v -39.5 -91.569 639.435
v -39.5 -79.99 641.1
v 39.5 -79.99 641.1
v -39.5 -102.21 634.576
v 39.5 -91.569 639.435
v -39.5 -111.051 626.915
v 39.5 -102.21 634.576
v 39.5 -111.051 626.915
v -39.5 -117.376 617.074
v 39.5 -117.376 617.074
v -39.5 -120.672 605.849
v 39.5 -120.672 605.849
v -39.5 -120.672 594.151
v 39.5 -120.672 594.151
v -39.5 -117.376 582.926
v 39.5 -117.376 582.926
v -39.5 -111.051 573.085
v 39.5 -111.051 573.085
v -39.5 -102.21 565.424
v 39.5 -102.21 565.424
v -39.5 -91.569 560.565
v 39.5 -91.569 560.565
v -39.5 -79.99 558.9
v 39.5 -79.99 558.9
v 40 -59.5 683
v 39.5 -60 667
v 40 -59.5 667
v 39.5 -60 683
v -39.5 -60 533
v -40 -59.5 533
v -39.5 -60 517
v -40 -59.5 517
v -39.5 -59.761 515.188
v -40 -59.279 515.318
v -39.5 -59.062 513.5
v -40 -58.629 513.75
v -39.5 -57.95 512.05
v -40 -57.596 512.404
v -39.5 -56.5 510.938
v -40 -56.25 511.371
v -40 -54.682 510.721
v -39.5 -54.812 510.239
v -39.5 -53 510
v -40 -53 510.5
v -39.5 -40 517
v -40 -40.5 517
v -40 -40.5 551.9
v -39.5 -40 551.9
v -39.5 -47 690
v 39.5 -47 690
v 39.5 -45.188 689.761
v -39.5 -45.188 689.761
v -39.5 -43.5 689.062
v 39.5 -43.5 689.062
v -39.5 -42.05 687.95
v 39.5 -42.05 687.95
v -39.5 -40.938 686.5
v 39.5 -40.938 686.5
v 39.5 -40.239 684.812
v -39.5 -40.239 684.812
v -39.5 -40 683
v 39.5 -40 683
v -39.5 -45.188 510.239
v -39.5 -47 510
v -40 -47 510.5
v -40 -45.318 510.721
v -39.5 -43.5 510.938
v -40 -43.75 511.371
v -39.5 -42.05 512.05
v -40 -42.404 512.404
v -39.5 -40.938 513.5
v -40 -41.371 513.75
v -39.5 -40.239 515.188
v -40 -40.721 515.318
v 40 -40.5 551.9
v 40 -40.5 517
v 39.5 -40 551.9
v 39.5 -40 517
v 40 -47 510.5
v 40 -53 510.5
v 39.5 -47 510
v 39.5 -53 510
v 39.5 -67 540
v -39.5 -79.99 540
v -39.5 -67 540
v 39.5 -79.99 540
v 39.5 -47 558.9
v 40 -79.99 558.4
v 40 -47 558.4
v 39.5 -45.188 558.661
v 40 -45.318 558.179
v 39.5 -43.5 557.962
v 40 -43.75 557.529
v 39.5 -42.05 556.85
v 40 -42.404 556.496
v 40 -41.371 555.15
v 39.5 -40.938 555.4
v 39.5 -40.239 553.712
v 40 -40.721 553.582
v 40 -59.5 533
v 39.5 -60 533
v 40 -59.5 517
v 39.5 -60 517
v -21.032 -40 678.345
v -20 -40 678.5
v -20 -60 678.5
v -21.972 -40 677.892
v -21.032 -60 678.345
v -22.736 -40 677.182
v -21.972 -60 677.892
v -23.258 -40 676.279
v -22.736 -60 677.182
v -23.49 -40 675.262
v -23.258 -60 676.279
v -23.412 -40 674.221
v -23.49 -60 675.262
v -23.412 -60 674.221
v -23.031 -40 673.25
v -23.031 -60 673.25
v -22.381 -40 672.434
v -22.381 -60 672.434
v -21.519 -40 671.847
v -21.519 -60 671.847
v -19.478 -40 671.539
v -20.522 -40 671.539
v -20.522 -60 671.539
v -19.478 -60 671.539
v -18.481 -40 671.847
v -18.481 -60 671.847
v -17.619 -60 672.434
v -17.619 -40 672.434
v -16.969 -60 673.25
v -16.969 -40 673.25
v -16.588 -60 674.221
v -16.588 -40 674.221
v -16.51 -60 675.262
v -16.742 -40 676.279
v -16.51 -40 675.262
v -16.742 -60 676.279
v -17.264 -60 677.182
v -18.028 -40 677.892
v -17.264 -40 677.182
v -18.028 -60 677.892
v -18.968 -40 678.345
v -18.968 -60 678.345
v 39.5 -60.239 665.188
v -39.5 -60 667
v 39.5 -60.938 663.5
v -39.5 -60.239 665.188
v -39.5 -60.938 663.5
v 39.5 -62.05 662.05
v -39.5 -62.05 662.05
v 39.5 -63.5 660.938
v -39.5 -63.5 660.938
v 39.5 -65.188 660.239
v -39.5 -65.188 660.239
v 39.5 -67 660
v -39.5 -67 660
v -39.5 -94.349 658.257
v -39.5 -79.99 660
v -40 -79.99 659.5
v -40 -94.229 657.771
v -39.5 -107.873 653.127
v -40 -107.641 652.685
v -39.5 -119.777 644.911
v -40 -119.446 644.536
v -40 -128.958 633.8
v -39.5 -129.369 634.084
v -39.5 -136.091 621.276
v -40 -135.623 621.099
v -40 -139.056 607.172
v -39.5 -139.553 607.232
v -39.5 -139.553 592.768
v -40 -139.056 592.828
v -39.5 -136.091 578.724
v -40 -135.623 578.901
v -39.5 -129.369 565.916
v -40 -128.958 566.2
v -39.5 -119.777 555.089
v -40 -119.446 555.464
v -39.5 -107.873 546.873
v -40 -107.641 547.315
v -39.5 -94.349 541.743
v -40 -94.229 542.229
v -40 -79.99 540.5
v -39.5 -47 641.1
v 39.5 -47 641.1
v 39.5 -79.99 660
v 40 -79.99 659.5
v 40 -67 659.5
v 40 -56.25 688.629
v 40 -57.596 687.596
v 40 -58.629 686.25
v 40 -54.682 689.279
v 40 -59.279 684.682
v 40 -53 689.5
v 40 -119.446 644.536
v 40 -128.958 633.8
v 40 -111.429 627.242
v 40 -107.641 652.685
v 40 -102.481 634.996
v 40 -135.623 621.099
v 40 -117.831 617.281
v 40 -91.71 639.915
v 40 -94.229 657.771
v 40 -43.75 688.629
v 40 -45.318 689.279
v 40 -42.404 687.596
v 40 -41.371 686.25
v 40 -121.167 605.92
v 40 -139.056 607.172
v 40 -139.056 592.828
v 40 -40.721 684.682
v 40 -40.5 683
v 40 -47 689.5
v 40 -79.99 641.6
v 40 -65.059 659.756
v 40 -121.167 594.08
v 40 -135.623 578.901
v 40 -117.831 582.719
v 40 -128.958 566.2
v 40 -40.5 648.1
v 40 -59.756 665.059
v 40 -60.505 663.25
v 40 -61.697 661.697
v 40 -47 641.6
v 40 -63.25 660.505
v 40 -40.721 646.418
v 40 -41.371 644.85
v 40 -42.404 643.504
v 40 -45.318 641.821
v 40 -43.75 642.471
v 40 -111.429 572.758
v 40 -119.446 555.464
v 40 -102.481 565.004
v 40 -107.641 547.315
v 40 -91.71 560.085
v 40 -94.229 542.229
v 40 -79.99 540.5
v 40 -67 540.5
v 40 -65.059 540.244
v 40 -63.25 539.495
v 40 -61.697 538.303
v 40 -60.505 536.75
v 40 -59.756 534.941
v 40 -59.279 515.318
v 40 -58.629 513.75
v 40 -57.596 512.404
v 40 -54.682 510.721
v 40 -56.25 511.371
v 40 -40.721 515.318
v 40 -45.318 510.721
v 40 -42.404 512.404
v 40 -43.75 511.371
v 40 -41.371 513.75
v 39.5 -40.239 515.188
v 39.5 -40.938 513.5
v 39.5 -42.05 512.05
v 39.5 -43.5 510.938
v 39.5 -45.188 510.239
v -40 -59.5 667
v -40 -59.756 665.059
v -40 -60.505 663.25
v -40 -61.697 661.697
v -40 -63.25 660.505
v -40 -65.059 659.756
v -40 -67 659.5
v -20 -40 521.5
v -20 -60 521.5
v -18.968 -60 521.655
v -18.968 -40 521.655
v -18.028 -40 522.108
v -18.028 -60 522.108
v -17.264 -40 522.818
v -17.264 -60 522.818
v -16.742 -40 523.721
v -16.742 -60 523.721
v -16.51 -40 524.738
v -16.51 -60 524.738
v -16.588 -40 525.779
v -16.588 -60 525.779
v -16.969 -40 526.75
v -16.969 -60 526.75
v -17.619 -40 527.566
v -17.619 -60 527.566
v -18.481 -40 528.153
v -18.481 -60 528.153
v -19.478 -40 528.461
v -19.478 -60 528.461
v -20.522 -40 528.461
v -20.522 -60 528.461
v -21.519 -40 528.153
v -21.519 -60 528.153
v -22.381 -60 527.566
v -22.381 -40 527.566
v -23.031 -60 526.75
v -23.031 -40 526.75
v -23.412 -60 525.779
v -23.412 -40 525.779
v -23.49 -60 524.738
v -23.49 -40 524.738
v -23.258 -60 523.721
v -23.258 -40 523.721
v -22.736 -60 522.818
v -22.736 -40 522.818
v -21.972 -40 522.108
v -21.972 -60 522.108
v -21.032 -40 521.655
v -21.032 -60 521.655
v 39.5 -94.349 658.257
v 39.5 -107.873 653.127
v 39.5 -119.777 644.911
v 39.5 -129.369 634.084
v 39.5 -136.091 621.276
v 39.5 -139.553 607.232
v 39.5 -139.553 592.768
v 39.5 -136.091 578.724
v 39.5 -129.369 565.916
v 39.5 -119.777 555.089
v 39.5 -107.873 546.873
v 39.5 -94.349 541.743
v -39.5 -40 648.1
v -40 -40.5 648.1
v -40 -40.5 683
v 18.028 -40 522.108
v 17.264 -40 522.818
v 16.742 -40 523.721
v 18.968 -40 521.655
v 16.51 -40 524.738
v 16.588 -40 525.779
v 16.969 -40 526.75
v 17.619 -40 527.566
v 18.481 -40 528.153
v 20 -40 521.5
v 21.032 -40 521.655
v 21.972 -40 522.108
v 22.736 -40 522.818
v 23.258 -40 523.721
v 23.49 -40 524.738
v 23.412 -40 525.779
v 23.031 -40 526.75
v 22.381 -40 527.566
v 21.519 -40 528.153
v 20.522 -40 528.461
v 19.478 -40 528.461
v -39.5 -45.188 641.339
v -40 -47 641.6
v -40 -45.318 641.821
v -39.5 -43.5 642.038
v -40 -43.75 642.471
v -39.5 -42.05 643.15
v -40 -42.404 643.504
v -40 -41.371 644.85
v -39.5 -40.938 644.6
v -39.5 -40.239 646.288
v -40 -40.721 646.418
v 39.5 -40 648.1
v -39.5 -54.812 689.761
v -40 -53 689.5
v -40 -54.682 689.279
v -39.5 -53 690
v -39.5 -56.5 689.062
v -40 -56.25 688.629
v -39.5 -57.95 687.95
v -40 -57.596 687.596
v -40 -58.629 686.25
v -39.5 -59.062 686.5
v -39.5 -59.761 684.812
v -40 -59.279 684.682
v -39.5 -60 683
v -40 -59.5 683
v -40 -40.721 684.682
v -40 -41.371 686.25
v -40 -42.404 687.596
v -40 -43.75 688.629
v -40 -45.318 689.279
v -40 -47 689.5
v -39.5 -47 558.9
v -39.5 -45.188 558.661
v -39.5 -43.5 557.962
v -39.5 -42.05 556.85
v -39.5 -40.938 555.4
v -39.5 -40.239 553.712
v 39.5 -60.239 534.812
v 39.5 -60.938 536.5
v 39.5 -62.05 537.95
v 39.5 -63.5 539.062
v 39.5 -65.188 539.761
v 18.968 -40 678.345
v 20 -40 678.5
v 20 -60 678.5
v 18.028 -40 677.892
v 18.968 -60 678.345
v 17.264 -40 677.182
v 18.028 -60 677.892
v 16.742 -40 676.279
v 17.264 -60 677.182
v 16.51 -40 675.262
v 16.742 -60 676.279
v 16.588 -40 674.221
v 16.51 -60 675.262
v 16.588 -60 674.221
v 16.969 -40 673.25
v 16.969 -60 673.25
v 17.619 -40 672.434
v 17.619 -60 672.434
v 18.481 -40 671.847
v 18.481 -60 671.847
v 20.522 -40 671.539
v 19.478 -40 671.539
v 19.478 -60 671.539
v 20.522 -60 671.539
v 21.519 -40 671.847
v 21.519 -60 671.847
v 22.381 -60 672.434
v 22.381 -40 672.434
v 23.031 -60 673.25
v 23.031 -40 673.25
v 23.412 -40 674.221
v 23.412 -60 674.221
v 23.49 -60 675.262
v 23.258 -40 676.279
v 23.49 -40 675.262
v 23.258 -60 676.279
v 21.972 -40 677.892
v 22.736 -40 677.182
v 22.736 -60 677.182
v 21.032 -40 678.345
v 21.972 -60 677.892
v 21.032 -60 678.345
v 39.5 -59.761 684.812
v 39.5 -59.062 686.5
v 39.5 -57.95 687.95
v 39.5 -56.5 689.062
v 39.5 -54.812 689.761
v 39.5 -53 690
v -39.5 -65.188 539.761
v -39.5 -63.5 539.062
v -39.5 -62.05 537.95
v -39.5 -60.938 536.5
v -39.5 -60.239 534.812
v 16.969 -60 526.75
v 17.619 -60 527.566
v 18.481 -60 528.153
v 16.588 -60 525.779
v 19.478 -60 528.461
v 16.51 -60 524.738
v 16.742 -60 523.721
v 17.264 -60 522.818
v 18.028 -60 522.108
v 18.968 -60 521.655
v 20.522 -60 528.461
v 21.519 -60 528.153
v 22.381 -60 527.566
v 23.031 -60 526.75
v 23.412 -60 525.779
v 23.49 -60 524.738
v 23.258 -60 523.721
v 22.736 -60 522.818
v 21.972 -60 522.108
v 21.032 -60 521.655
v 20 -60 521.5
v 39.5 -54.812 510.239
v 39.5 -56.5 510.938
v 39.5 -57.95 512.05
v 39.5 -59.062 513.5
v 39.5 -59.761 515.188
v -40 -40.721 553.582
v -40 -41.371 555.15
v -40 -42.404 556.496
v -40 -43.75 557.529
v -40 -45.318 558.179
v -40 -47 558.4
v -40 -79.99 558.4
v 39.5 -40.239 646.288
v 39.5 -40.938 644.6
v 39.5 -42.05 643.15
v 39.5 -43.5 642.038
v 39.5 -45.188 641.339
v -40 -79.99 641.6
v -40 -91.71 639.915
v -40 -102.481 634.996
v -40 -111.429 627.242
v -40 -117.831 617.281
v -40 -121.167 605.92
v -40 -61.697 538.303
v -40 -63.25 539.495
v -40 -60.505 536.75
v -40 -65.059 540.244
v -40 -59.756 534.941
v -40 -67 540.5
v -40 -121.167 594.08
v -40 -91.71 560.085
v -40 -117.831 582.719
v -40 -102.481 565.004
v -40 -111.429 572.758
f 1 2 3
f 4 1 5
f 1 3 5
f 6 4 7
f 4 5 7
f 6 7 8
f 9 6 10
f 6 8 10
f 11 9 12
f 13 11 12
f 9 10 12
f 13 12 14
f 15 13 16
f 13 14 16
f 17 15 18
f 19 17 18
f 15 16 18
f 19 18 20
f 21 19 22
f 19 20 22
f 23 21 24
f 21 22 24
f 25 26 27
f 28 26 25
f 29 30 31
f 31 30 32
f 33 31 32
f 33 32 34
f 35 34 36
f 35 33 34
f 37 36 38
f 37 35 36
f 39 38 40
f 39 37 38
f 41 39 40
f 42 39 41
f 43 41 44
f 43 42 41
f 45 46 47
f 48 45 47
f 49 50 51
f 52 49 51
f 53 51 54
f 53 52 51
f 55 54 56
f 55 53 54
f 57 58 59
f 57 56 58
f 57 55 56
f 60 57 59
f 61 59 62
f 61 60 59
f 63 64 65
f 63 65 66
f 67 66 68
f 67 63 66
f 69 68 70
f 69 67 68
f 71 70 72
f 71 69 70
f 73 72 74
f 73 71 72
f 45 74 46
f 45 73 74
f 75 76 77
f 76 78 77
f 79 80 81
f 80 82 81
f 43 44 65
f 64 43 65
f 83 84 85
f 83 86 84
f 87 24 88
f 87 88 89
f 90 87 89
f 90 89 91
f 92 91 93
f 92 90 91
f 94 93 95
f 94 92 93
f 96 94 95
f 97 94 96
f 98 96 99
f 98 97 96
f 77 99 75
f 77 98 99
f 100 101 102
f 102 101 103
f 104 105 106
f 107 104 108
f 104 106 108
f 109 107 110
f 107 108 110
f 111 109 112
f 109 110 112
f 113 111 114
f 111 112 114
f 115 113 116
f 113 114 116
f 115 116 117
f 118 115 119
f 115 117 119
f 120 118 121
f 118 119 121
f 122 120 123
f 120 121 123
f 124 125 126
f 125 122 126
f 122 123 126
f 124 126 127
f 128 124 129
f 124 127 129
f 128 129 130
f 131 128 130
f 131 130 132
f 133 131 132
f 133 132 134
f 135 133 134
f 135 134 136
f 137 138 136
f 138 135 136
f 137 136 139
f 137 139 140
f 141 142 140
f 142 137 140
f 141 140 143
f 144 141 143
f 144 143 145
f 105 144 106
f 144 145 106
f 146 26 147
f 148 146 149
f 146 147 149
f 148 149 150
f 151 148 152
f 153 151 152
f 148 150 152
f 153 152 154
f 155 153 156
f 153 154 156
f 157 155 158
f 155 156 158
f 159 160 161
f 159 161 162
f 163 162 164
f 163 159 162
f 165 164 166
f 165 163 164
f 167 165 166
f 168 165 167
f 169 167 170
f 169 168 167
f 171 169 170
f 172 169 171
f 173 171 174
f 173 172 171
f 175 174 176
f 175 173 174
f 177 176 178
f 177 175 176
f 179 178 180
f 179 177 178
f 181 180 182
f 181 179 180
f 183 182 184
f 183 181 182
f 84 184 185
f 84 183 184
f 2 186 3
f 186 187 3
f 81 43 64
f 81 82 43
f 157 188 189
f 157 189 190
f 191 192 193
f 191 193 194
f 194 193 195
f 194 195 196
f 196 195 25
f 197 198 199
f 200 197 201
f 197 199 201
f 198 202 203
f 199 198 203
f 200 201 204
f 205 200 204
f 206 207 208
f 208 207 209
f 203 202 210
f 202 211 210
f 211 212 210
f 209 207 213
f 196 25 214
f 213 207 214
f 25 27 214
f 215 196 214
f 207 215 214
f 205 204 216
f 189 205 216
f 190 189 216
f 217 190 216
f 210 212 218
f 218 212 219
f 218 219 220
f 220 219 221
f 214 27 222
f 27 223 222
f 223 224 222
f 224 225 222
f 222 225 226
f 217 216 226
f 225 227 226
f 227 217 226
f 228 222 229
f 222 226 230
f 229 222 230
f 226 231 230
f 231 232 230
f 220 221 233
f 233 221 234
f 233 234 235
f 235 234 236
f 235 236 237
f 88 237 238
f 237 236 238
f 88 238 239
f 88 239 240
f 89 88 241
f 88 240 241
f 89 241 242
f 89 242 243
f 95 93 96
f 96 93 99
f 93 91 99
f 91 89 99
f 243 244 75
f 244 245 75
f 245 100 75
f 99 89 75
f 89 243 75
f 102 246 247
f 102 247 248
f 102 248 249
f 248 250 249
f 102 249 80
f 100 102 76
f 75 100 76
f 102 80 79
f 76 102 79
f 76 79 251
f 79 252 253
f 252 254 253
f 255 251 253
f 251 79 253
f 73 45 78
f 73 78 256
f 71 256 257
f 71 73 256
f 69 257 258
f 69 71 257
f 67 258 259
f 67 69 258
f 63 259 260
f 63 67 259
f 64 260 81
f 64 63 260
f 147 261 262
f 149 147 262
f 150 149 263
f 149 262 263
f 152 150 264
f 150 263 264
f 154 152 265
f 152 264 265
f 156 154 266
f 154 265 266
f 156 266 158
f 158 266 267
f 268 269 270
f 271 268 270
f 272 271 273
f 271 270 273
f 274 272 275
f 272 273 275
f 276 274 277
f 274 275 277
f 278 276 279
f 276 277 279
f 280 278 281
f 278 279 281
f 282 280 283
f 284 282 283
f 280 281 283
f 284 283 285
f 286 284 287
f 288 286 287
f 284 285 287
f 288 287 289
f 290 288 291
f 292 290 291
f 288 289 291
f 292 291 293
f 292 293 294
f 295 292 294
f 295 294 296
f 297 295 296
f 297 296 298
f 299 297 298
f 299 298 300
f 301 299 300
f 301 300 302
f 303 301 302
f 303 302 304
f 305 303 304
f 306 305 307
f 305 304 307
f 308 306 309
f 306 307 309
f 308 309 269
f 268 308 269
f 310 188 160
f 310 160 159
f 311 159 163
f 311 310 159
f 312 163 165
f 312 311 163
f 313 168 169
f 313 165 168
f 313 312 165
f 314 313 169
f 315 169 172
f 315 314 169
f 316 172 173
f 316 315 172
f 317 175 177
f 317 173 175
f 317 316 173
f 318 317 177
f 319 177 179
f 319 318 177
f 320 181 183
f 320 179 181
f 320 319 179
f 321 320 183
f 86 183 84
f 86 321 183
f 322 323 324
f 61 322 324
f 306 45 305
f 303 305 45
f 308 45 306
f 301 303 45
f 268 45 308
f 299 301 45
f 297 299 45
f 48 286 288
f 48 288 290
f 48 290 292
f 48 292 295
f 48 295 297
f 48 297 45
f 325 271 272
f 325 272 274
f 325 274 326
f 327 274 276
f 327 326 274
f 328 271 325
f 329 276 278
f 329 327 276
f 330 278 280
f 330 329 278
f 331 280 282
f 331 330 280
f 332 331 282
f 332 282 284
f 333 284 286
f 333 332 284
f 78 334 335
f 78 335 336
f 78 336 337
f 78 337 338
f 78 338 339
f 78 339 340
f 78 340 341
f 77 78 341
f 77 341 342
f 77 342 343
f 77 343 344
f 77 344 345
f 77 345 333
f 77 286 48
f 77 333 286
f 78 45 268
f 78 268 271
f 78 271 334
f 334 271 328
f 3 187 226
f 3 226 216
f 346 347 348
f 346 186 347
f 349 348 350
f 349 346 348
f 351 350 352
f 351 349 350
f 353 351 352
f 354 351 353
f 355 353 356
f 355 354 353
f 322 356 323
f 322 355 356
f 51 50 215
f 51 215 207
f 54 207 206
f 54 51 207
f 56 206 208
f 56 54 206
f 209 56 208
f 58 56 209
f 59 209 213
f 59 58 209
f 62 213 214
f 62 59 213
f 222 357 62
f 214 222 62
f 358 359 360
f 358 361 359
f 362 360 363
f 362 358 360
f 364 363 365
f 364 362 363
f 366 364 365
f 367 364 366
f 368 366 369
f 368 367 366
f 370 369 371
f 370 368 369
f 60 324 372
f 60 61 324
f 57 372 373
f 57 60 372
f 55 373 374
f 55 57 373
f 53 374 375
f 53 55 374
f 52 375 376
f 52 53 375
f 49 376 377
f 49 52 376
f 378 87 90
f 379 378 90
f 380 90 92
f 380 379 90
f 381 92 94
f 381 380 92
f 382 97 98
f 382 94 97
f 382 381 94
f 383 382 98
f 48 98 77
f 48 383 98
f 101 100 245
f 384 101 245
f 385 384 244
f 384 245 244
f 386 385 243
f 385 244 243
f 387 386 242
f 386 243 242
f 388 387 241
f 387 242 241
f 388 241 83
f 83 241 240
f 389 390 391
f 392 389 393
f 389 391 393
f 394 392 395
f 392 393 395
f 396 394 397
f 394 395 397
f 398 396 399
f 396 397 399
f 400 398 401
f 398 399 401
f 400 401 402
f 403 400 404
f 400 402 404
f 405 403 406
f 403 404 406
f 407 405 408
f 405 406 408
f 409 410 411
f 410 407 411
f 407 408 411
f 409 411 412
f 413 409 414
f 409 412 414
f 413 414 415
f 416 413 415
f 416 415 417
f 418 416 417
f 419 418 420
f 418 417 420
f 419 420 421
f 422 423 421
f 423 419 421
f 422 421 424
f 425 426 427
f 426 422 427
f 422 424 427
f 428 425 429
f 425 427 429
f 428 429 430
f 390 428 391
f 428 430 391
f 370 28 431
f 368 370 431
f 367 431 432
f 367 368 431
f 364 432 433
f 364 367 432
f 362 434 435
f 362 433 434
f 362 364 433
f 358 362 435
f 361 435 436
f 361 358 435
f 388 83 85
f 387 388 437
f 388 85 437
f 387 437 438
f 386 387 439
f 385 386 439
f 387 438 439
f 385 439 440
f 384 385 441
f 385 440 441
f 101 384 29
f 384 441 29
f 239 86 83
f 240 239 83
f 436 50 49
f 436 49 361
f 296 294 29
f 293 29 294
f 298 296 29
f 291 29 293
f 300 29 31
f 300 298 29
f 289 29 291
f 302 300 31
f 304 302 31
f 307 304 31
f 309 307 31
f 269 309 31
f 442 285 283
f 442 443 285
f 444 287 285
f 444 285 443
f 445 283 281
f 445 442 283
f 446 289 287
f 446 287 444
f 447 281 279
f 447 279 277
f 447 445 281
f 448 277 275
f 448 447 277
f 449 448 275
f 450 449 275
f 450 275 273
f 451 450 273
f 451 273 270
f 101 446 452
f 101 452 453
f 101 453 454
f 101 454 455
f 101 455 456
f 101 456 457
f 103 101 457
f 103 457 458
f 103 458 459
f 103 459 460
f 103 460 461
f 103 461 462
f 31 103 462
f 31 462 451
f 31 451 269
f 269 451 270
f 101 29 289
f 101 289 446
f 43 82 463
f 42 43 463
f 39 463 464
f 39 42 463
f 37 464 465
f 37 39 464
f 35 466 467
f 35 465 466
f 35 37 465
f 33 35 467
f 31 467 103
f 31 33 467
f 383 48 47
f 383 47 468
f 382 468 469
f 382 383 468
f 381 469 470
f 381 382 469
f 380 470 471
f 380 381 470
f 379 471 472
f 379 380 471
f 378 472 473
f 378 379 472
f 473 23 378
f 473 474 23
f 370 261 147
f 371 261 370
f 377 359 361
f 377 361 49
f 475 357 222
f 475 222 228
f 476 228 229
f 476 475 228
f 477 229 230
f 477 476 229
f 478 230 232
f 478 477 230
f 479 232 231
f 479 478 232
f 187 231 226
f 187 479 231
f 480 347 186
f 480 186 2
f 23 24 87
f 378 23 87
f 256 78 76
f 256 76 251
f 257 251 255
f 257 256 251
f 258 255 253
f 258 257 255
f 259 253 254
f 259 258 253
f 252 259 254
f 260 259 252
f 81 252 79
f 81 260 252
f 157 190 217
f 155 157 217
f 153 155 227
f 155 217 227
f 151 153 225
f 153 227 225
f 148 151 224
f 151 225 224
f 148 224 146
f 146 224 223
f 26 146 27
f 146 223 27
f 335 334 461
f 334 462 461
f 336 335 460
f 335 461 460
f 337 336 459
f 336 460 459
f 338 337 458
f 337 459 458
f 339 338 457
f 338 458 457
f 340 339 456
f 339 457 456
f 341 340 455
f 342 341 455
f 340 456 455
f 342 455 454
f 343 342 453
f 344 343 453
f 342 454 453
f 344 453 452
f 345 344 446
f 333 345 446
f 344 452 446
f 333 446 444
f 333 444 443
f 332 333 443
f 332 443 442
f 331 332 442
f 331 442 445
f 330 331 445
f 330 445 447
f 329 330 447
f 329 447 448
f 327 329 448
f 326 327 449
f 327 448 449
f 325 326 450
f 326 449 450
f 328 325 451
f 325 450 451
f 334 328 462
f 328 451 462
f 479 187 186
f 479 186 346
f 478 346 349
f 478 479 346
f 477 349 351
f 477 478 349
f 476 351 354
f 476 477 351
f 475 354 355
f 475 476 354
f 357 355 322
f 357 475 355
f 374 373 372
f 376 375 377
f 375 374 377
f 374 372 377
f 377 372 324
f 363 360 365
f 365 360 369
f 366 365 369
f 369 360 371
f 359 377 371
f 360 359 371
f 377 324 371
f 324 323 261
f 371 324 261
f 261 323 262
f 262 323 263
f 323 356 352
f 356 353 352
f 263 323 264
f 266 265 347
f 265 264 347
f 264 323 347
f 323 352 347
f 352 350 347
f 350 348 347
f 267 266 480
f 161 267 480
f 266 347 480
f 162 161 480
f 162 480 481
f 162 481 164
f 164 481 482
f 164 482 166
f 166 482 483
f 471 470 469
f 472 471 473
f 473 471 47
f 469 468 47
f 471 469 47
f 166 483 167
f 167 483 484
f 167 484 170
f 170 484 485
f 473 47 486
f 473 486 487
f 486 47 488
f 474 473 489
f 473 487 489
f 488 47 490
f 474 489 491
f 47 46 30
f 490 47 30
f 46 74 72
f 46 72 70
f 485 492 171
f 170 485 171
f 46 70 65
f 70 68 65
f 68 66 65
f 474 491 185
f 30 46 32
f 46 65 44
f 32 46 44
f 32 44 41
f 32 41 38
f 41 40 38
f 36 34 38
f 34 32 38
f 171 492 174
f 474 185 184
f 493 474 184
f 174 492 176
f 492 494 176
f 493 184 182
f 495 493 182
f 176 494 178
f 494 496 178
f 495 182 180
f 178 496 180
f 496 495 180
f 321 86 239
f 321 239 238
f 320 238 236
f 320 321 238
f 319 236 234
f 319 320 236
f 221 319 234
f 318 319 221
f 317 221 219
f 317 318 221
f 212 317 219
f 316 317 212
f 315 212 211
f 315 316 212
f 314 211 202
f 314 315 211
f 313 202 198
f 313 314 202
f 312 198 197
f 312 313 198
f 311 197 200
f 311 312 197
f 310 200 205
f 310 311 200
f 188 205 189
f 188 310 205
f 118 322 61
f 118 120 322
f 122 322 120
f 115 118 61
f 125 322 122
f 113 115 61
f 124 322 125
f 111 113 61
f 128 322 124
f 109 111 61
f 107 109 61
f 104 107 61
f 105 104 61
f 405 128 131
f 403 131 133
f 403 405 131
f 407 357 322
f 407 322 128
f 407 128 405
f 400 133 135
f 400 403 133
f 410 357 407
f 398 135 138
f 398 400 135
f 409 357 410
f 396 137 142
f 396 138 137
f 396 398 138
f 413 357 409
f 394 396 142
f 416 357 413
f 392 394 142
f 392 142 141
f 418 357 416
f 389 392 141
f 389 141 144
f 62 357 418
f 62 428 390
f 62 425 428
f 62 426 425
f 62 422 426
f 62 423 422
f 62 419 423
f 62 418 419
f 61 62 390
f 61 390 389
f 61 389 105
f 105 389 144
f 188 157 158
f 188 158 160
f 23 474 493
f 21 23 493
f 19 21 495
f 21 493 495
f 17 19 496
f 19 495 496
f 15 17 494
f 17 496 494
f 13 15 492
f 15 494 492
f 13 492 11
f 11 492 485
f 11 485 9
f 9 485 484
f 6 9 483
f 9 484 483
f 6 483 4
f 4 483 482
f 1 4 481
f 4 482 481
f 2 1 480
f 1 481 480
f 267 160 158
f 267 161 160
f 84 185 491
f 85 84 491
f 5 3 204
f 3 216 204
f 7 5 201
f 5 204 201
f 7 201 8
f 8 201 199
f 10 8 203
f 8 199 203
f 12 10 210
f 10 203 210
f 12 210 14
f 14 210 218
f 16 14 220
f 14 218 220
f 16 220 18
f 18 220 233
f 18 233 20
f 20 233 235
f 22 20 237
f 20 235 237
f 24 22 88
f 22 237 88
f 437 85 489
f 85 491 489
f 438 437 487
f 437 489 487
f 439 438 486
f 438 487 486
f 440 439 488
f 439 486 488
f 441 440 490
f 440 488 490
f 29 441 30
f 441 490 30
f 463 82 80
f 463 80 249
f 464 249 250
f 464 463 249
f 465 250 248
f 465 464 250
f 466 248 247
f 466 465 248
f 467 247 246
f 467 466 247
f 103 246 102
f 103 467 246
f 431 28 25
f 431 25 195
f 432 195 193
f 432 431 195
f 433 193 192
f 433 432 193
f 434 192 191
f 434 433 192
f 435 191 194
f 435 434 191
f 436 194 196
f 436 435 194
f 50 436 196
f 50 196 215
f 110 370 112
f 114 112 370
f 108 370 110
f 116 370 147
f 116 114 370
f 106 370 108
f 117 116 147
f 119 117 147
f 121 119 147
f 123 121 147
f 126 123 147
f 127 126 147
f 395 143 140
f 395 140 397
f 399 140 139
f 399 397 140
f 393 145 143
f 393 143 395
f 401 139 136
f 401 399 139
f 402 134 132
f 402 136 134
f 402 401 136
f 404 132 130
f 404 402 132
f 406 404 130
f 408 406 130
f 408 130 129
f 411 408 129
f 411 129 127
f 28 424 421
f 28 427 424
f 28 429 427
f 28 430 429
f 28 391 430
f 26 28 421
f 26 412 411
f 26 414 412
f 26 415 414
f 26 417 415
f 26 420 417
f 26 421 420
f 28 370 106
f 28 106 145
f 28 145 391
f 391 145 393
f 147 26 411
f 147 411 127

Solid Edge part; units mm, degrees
sketch "Sketch1" plane through (0, 0, 0) normal (0, 0, 1) x (1, 0, 0)
  line L0 (40, -40) -> (40, 40)
  line L1 (40, 40) -> (-40, 40)
  line L2 (-40, 40) -> (-40, -40)
  line L3 (-40, -40) -> (40, -40)
extrude "Protrusion1" add sketch "Sketch1" along normal blind 700
extrude "Extrusionsausschnitt_1" [suppressed]
sketch "Sketch2" plane through (40, 0, 350) normal (1, 0, 0) x (0, 0, 1)
  circle A0 centre (250, 79.99) radius 60
  circle A1 centre (250, 79.99) radius 41.1
  dimension "D1" = 79.99
  dimension "D2" = 120
  dimension "D3" = 82.2
  dimension "D4" = 600
extrude "Protrusion2" add sketch "Sketch2" against normal up to vertex (80 mm away)
sketch "Sketch3" plane through (40, -55, 350) normal (1, 0, 0) x (0, 0, 1)
  line L0 (190, 5) -> (160, 5)
  line L1 (160, 5) -> (160, -15)
  line L2 (160, -15) -> (218.8953, -15)
  line L3 (218.8953, -15) -> (190, 24.99)
  line L4 (190, 24.99) -> (190, 5)
extrude "Protrusion3" add sketch "Sketch3" against normal up to vertex (80 mm away)
mirror "Mirror1" about plane through (0, 0, 600) normal (0, 0, 1) of "Protrusion3"
hole "Bohrung_1" [suppressed]
hole "Hole1" [suppressed]
mirror "Mirror2" [suppressed]
sketch "Sketch4" plane through (0, 0, 700) normal (0, 0, 1) x (-1, 0, 0)
  circle A0 centre (0, 0) radius 5
extrude "Extrusionsausschnitt_2" cut sketch "Sketch4" against normal blind 36.6109
sketch "Sketch5" plane through (40, -55, 350) normal (1, 0, 0) x (0, 0, -1)
  line L0 (-350, 95) -> (350, 95)
  line L1 (350, 95) -> (350, 15)
  line L2 (350, 15) -> (-350, 15)
  line L3 (-350, 15) -> (-350, 95)
extrude "Extrusionsausschnitt_3" cut sketch "Sketch5" against normal blind 305.8385
sketch "Sketch6" plane through (40, -89.995, 600) normal (1, 0, 0) x (0, 0, 1)
  line L0 (41.1, -65.4793) -> (41.1, -10.005)
  line L1 (41.1, -10.005) -> (-41.1, -10.005)
  line L2 (-41.1, -10.005) -> (-41.1, -65.4793)
  line L3 (-41.1, -65.4793) -> (41.1, -65.4793)
extrude "Extrusionsausschnitt_4" cut sketch "Sketch6" against normal blind 204.5794
hole "Bohrung_3" at (20, -60, 525) direction (0, 1, 0) diameter 7 end up to next
hole "Hole2" at (-20, -60, 525) direction (0, 1, 0) diameter 7 end up to next
mirror "Mirror3" about plane through (0, 0, 600) normal (0, 0, 1) of "Bohrung_3", "Hole2"
fillet "Verrundung_1" radius 7 8 edges at (0, -40, 641.1) (0, -40, 690) (0, -60, 690) (0, -60, 540) (0, -60, 510) (0, -40, 510) (0, -40, 558.9) (0, -60, 660)
chamfer "Fase_1" distance 0.5 angle 45 40 edges at (40, -40, 534.45) (40, -42.0503, 556.8497) (40, -63.495, 558.9) (40, -121.09, 600) (40, -63.495, 641.1) (40, -42.0503, 643.1503) (40, -40, 665.55) (40, -42.0503, 687.9497) (40, -50, 690) (40, -57.9497, 687.9497) (40, -60, 675) (40, -62.0503, 662.0503) (40, -73.495, 660) (40, -139.99, 600) (40, -73.495, 540) (40, -62.0503, 537.9497) (40, -60, 525) (40, -57.9497, 512.0503) (40, -50, 510) (40, -42.0503, 512.0503) (-40, -63.495, 558.9) (-40, -42.0503, 556.8497) (-40, -40, 534.45) (-40, -42.0503, 512.0503) (-40, -50, 510) (-40, -57.9497, 512.0503) (-40, -60, 525) (-40, -62.0503, 537.9497) (-40, -73.495, 540) (-40, -139.99, 600) (-40, -73.495, 660) (-40, -62.0503, 662.0503) (-40, -60, 675) (-40, -57.9497, 687.9497) (-40, -50, 690) (-40, -42.0503, 687.9497) (-40, -40, 665.55) (-40, -42.0503, 643.1503) (-40, -63.495, 641.1) (-40, -121.09, 600)
